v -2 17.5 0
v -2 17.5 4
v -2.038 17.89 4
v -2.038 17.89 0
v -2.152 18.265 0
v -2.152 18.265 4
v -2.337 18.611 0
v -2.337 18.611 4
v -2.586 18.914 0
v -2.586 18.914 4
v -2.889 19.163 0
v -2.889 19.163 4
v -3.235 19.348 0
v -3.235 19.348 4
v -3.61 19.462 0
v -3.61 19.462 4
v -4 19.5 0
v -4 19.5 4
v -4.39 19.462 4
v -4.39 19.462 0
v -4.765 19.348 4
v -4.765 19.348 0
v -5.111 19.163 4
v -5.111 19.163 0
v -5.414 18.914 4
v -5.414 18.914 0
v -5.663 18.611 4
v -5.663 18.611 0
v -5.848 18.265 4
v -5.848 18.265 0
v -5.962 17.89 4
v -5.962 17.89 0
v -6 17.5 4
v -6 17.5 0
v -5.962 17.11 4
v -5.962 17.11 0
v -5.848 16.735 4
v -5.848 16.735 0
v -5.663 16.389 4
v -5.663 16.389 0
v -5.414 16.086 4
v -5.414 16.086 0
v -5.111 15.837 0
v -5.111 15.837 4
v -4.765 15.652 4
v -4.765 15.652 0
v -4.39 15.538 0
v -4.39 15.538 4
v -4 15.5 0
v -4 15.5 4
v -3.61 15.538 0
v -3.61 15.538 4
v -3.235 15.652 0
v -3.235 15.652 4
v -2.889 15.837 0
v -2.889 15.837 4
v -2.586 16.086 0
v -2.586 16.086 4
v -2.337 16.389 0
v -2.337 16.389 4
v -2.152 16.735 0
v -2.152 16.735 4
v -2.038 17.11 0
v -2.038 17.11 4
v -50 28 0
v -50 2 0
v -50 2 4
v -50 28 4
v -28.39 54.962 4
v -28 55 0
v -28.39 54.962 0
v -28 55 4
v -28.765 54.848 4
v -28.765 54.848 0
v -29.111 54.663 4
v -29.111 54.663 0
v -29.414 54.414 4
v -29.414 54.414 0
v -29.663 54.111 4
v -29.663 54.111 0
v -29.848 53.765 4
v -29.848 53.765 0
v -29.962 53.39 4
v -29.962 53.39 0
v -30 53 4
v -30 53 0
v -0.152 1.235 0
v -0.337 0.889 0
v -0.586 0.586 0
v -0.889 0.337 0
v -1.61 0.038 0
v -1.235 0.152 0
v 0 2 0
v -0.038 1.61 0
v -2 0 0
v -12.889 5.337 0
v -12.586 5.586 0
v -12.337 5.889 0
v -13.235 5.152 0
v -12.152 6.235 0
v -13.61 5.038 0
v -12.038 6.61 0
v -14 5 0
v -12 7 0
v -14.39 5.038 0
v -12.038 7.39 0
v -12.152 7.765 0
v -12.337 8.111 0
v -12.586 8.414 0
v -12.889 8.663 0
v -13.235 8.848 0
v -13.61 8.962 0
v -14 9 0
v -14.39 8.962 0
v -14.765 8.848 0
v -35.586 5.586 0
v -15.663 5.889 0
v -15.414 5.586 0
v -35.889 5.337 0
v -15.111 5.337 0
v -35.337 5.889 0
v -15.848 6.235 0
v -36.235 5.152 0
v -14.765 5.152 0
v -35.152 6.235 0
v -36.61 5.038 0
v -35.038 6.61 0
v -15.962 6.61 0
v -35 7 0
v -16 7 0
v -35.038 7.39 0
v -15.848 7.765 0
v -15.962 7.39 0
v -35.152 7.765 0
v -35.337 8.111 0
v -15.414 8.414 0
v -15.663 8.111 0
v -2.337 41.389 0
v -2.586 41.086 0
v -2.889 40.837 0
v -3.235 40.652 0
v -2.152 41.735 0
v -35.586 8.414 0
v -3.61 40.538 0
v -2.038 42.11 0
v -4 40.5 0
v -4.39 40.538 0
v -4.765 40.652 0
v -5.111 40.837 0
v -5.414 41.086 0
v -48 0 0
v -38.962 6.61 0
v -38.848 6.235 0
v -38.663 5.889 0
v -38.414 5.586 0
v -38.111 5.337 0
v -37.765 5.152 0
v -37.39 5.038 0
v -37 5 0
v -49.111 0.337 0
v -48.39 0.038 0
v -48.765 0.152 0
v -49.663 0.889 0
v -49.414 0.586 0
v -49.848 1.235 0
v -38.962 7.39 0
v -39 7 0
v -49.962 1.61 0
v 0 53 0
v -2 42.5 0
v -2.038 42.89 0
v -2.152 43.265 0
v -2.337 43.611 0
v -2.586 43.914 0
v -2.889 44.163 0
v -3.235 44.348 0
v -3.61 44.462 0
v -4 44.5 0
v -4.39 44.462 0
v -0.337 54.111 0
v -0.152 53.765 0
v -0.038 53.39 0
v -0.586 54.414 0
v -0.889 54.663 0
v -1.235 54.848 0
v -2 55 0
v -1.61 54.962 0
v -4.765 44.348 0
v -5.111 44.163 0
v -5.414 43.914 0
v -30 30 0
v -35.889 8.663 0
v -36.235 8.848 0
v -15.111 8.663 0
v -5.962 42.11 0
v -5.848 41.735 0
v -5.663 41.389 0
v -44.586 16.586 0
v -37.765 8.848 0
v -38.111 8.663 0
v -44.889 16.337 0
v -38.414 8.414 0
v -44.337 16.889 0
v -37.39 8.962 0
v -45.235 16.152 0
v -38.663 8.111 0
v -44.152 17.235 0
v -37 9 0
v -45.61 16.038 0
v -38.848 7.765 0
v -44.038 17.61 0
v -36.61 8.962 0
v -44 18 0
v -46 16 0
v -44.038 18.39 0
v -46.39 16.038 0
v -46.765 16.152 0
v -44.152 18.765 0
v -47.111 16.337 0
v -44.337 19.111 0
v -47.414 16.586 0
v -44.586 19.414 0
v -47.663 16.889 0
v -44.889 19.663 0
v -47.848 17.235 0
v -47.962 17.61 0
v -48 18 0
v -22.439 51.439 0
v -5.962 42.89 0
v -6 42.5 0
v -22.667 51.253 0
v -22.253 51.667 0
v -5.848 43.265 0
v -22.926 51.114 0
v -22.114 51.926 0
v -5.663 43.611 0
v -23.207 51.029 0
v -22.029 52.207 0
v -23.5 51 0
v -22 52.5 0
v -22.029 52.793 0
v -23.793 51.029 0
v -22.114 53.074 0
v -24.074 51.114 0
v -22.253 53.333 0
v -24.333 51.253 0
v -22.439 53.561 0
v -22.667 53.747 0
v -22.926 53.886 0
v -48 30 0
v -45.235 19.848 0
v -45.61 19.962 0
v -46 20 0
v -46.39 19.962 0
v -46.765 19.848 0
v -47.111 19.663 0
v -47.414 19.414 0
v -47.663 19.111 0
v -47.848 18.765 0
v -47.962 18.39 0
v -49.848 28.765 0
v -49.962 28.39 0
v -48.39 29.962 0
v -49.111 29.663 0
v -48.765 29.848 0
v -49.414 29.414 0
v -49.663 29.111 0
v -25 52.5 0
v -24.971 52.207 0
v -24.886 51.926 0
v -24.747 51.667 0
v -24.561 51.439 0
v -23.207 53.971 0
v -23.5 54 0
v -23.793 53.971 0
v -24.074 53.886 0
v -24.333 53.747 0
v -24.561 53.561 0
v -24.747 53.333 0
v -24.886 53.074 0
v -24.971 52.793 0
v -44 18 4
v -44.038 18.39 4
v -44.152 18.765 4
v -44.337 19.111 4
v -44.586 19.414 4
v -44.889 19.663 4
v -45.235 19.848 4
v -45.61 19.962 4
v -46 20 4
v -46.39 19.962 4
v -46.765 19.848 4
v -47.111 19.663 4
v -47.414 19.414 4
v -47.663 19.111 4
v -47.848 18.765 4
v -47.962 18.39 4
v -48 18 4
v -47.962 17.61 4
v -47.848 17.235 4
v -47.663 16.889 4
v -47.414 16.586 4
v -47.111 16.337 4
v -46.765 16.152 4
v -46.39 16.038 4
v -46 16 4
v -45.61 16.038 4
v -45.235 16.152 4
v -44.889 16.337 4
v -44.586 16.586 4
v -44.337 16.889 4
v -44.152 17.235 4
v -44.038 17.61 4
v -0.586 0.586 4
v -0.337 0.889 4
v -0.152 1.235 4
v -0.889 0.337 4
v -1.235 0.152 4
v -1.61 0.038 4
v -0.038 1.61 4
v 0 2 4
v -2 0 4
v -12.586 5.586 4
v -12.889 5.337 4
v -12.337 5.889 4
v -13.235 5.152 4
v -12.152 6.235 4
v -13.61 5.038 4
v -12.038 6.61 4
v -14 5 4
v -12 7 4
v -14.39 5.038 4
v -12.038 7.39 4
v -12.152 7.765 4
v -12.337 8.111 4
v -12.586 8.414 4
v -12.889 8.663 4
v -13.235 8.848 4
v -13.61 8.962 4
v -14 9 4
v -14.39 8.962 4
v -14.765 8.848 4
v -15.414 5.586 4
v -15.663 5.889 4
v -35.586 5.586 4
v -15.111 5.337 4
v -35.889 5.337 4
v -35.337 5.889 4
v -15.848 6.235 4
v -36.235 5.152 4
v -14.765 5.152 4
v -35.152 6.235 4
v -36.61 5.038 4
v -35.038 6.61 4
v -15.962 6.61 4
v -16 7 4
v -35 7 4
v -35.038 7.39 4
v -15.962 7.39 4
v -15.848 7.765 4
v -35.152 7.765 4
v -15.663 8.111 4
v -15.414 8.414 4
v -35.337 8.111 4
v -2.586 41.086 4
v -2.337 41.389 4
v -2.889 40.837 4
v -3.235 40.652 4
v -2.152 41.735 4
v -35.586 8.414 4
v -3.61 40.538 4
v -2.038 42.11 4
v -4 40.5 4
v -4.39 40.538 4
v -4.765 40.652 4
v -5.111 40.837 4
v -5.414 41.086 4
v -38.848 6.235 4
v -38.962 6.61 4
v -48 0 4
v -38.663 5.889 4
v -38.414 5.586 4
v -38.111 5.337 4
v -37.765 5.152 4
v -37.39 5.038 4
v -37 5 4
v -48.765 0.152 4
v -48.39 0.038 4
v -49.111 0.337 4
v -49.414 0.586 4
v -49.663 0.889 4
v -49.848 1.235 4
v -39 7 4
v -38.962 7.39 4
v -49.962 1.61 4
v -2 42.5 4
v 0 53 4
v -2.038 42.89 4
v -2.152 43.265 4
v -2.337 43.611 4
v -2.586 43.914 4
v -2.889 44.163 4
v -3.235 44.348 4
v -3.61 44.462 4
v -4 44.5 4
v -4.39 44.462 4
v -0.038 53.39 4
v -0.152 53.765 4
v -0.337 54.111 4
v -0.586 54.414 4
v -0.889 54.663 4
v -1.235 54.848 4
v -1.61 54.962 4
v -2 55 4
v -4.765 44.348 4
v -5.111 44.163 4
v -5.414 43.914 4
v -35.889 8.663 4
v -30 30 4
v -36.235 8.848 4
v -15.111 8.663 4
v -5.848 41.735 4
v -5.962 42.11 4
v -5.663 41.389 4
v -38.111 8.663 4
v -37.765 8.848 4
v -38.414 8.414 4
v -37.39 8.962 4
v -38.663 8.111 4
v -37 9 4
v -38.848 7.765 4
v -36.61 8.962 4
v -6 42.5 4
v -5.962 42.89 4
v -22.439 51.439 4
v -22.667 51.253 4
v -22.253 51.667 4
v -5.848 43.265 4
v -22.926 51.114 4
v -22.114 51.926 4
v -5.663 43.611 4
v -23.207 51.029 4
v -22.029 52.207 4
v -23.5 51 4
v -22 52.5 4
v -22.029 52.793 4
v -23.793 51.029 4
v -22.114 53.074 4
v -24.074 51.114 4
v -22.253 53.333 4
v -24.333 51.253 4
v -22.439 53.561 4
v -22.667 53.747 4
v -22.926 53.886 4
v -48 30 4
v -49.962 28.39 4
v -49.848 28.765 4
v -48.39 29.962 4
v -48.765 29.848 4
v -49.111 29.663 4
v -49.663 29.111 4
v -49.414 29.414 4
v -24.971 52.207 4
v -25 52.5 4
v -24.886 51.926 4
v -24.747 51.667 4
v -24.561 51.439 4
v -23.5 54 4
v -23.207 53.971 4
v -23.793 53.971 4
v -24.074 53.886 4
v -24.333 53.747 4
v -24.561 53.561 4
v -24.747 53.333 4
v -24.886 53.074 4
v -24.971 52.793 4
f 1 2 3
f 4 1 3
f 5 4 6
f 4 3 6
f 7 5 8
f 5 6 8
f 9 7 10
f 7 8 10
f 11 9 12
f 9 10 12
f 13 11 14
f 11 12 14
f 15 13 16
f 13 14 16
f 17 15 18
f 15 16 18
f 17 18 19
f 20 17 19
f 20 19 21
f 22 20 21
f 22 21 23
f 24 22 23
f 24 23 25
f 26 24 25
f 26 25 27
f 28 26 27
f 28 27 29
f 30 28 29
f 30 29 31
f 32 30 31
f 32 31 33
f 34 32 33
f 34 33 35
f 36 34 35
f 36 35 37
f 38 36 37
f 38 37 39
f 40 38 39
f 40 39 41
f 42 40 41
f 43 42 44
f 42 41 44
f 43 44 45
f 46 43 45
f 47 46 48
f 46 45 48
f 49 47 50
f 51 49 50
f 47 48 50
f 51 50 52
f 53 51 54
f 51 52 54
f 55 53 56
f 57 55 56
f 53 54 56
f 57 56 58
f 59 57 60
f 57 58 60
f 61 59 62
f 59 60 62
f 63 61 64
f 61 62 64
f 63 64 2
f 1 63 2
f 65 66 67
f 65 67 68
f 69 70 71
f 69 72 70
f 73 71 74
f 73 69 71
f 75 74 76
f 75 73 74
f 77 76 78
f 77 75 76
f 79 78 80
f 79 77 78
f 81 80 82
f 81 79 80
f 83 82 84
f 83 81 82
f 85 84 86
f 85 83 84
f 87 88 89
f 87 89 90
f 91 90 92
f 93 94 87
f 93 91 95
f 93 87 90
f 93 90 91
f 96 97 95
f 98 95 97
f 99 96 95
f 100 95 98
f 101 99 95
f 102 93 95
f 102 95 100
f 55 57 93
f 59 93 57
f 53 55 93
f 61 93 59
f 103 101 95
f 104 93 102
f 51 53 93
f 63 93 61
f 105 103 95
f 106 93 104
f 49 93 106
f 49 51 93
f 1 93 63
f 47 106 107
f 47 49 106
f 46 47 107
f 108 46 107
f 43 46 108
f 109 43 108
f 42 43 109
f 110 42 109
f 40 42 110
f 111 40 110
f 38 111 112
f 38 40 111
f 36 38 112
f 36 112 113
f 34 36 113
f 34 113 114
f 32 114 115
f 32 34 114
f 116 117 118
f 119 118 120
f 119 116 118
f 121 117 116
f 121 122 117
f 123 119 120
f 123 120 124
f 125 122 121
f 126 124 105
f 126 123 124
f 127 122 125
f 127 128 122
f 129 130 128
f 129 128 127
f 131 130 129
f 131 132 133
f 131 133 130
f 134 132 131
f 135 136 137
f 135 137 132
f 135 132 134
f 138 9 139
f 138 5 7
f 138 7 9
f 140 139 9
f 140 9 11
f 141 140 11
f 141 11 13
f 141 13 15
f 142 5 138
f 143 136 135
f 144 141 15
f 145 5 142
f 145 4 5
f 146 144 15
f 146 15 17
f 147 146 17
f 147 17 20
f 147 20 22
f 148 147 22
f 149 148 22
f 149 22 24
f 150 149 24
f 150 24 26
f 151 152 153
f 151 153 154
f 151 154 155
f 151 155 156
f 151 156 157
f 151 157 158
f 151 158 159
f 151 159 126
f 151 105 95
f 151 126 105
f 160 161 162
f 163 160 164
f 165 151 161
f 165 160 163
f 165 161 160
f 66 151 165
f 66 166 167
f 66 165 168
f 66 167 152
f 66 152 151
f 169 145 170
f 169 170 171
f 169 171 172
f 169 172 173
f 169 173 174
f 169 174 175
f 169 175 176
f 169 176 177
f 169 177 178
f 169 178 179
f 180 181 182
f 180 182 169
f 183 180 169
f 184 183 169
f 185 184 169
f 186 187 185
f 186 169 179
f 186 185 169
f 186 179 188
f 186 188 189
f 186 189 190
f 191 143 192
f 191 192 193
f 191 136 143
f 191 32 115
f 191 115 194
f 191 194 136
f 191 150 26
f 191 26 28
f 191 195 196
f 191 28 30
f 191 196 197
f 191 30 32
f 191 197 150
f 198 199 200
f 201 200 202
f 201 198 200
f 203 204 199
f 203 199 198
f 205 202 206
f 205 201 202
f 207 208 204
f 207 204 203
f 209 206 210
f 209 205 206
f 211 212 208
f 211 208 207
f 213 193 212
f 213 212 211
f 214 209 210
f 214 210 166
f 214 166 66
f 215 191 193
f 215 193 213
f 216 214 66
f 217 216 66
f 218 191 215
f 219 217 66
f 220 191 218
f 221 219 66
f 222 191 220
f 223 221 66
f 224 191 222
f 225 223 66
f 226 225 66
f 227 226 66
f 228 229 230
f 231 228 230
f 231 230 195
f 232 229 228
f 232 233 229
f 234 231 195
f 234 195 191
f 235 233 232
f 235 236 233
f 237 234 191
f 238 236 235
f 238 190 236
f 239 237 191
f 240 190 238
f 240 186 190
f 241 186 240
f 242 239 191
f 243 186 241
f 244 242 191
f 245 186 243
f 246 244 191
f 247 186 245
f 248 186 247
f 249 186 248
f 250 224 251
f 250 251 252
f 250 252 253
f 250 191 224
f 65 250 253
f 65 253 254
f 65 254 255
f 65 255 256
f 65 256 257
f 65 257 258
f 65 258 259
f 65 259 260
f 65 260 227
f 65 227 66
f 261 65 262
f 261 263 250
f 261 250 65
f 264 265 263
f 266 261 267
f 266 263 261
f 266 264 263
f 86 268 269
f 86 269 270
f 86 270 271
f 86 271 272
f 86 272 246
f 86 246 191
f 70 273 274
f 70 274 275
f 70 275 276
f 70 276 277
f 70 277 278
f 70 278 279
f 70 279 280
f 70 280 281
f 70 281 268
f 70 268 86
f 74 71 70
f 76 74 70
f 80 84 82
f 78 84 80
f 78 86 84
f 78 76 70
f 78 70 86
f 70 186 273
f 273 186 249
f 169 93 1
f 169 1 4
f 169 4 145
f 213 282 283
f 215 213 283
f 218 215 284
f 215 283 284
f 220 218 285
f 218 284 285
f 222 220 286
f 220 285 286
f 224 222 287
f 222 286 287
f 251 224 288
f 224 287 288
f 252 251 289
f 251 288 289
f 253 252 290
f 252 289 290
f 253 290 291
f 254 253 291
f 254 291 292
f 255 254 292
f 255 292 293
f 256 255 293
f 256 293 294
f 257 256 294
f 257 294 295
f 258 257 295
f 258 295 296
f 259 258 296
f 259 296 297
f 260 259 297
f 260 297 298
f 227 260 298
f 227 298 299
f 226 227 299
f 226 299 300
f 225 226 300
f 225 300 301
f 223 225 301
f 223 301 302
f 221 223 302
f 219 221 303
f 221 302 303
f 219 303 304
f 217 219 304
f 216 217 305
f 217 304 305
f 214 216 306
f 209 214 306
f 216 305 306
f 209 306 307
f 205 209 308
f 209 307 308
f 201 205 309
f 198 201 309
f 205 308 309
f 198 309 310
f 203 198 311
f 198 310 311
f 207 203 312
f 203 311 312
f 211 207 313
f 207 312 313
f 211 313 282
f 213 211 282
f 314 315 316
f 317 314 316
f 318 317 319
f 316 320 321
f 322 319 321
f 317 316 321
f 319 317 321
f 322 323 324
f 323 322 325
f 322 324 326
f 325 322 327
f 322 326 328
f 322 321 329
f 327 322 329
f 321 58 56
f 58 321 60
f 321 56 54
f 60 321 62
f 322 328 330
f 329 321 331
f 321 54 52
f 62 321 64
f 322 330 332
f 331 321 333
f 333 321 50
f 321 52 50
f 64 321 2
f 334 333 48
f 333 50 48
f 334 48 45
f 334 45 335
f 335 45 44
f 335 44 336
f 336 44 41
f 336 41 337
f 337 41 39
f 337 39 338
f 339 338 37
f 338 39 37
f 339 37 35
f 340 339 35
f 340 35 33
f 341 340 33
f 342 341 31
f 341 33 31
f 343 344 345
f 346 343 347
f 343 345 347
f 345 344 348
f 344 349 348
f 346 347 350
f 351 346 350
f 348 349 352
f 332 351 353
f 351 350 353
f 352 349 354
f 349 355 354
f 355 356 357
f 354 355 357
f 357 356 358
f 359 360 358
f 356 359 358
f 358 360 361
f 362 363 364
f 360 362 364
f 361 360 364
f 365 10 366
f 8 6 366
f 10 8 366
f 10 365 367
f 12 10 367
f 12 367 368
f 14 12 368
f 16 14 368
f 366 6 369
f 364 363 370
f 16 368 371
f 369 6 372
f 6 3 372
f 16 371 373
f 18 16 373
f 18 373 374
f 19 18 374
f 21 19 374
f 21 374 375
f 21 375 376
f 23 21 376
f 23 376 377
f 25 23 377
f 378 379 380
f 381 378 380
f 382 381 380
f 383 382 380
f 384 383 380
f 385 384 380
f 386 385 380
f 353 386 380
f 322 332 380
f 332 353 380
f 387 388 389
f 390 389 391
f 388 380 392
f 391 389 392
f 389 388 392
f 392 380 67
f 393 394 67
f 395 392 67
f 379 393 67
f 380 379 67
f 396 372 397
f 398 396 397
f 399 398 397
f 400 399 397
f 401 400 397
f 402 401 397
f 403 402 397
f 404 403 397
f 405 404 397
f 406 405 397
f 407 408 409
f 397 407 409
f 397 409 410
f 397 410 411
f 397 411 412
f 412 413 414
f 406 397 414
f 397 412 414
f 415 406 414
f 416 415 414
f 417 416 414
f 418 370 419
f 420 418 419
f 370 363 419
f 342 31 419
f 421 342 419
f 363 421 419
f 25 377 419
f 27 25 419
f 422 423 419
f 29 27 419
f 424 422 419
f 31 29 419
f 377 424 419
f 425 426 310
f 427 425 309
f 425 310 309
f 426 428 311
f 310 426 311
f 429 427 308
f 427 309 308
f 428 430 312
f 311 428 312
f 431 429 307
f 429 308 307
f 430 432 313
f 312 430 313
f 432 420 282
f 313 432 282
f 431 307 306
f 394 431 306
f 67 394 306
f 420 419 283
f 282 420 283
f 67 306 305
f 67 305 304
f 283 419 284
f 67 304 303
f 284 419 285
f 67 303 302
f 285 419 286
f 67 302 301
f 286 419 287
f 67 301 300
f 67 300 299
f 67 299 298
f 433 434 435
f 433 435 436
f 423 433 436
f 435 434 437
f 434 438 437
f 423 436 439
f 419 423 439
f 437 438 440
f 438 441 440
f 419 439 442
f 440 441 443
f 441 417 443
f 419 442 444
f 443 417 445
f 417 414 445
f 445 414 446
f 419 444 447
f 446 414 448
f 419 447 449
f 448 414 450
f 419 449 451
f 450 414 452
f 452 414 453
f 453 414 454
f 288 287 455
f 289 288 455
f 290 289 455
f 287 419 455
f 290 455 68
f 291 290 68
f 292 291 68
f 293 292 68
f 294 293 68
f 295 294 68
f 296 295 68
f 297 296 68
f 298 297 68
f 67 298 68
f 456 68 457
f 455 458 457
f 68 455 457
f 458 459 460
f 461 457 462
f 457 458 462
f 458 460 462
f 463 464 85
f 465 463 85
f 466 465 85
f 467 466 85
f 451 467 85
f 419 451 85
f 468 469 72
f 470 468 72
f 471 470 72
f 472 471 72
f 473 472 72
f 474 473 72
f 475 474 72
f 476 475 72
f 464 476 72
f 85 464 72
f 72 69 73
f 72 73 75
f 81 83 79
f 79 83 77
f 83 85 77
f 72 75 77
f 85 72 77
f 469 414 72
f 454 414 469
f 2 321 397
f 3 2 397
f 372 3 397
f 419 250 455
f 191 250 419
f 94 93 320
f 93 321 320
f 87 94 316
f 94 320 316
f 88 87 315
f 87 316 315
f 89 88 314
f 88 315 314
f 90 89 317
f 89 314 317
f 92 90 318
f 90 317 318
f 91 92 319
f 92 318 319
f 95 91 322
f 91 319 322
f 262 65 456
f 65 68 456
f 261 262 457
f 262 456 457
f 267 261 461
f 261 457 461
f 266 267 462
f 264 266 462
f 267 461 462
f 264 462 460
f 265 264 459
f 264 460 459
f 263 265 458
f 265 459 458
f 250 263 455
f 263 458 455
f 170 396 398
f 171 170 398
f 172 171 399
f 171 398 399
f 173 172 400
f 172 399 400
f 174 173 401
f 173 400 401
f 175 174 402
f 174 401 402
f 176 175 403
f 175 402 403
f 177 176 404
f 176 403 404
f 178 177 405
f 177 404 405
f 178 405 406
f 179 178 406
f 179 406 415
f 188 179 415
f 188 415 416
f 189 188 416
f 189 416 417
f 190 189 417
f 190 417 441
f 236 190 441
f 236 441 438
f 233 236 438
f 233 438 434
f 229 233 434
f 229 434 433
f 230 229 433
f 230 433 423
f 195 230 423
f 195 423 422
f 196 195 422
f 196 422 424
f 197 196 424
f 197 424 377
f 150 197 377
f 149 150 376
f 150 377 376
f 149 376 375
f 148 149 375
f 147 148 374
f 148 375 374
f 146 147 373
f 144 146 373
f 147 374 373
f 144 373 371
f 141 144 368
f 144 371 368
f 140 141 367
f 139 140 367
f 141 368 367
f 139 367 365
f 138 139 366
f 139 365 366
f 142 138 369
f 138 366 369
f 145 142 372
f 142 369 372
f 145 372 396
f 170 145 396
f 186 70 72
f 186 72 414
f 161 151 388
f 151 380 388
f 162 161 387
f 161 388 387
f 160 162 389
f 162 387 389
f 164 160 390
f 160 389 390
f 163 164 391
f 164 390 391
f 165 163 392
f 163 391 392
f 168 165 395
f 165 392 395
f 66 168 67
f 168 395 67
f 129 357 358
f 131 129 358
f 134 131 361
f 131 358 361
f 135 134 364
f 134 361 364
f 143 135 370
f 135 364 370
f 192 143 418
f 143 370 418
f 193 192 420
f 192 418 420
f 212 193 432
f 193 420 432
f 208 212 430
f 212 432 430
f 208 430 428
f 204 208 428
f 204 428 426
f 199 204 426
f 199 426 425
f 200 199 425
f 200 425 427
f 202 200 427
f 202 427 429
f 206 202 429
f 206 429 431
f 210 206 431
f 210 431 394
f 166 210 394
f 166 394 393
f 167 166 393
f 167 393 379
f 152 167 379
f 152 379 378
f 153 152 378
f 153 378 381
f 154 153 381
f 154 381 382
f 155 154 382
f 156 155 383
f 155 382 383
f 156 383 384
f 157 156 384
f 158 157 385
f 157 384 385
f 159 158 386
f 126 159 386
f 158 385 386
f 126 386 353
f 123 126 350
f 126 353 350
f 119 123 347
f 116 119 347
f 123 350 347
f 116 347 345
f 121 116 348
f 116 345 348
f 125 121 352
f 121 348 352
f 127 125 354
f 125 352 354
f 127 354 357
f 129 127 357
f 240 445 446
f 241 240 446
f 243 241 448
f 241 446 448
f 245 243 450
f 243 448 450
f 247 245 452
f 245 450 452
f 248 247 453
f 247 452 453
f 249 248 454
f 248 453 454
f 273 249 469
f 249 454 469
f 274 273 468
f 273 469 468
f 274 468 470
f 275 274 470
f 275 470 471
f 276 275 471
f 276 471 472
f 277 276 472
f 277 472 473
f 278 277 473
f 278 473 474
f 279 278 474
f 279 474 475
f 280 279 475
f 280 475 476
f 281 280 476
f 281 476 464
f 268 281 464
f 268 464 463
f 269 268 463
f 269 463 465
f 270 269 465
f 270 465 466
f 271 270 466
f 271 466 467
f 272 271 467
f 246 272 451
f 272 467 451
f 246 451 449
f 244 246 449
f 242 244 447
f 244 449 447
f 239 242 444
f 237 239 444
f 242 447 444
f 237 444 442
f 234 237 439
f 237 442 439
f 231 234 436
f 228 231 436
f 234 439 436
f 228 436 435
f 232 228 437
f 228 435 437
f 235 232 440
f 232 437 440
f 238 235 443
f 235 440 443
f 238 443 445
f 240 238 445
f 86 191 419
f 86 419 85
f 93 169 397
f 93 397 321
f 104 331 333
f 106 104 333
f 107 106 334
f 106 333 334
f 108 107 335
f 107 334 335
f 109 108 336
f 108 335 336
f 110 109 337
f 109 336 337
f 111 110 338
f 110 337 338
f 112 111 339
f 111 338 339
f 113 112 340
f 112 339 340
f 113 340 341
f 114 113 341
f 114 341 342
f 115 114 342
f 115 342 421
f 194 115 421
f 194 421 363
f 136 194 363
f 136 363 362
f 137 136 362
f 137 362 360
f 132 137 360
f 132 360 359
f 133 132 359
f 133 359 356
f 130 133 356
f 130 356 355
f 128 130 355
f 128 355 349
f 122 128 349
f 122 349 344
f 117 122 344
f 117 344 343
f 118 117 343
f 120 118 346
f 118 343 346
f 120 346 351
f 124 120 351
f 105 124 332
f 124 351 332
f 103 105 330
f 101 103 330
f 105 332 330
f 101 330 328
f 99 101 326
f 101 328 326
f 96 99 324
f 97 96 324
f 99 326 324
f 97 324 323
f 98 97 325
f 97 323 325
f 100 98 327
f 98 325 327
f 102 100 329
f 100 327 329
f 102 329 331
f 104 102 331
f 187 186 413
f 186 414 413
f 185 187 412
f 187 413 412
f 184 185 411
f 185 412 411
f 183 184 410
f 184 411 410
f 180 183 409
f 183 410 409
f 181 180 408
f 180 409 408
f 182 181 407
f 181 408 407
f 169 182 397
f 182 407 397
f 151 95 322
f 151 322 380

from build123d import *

# Parameters (mm, degrees)
BOSS_EXTRUDE1_DEPTH = 4
FILLET1_R           = 2
SKETCH3_R           = 1.5
SKETCH3_R_2         = 2
CUT_EXTRUDE1_DEPTH  = 10


with BuildPart() as part:
    # Sketch1 → Boss-Extrude1 (new body)
    with BuildSketch(Plane.XY):
        Polygon((-30, 55), (0, 55), (0, 0), (-50, 0), (-50, 30), (-30, 30), align=None)
    extrude(amount=BOSS_EXTRUDE1_DEPTH)

    # Fillet1
    fillet1_edges = [part.edges().sort_by_distance(p)[0] for p in [
        (0, 0, 2),
        (-50, 0, 2),
        (-50, 30, 2),
        (-30, 55, 2),
        (0, 55, 2),
    ]]
    fillet(fillet1_edges, radius=FILLET1_R)

    # Sketch3 → Cut-Extrude1 (cut)
    with BuildSketch(Plane.XY.offset(4)):
        with Locations((-23.5, 52.5)):
            Circle(SKETCH3_R)
        with Locations((-46, 18)):
            Circle(SKETCH3_R_2)
        with Locations((-37, 7)):
            Circle(SKETCH3_R_2)
        with Locations((-14, 7)):
            Circle(SKETCH3_R_2)
        with Locations((-4, 17.5)):
            Circle(SKETCH3_R_2)
        with Locations((-4, 42.5)):
            Circle(SKETCH3_R_2)
    extrude(amount=-CUT_EXTRUDE1_DEPTH, mode=Mode.SUBTRACT)


solid = part.part
